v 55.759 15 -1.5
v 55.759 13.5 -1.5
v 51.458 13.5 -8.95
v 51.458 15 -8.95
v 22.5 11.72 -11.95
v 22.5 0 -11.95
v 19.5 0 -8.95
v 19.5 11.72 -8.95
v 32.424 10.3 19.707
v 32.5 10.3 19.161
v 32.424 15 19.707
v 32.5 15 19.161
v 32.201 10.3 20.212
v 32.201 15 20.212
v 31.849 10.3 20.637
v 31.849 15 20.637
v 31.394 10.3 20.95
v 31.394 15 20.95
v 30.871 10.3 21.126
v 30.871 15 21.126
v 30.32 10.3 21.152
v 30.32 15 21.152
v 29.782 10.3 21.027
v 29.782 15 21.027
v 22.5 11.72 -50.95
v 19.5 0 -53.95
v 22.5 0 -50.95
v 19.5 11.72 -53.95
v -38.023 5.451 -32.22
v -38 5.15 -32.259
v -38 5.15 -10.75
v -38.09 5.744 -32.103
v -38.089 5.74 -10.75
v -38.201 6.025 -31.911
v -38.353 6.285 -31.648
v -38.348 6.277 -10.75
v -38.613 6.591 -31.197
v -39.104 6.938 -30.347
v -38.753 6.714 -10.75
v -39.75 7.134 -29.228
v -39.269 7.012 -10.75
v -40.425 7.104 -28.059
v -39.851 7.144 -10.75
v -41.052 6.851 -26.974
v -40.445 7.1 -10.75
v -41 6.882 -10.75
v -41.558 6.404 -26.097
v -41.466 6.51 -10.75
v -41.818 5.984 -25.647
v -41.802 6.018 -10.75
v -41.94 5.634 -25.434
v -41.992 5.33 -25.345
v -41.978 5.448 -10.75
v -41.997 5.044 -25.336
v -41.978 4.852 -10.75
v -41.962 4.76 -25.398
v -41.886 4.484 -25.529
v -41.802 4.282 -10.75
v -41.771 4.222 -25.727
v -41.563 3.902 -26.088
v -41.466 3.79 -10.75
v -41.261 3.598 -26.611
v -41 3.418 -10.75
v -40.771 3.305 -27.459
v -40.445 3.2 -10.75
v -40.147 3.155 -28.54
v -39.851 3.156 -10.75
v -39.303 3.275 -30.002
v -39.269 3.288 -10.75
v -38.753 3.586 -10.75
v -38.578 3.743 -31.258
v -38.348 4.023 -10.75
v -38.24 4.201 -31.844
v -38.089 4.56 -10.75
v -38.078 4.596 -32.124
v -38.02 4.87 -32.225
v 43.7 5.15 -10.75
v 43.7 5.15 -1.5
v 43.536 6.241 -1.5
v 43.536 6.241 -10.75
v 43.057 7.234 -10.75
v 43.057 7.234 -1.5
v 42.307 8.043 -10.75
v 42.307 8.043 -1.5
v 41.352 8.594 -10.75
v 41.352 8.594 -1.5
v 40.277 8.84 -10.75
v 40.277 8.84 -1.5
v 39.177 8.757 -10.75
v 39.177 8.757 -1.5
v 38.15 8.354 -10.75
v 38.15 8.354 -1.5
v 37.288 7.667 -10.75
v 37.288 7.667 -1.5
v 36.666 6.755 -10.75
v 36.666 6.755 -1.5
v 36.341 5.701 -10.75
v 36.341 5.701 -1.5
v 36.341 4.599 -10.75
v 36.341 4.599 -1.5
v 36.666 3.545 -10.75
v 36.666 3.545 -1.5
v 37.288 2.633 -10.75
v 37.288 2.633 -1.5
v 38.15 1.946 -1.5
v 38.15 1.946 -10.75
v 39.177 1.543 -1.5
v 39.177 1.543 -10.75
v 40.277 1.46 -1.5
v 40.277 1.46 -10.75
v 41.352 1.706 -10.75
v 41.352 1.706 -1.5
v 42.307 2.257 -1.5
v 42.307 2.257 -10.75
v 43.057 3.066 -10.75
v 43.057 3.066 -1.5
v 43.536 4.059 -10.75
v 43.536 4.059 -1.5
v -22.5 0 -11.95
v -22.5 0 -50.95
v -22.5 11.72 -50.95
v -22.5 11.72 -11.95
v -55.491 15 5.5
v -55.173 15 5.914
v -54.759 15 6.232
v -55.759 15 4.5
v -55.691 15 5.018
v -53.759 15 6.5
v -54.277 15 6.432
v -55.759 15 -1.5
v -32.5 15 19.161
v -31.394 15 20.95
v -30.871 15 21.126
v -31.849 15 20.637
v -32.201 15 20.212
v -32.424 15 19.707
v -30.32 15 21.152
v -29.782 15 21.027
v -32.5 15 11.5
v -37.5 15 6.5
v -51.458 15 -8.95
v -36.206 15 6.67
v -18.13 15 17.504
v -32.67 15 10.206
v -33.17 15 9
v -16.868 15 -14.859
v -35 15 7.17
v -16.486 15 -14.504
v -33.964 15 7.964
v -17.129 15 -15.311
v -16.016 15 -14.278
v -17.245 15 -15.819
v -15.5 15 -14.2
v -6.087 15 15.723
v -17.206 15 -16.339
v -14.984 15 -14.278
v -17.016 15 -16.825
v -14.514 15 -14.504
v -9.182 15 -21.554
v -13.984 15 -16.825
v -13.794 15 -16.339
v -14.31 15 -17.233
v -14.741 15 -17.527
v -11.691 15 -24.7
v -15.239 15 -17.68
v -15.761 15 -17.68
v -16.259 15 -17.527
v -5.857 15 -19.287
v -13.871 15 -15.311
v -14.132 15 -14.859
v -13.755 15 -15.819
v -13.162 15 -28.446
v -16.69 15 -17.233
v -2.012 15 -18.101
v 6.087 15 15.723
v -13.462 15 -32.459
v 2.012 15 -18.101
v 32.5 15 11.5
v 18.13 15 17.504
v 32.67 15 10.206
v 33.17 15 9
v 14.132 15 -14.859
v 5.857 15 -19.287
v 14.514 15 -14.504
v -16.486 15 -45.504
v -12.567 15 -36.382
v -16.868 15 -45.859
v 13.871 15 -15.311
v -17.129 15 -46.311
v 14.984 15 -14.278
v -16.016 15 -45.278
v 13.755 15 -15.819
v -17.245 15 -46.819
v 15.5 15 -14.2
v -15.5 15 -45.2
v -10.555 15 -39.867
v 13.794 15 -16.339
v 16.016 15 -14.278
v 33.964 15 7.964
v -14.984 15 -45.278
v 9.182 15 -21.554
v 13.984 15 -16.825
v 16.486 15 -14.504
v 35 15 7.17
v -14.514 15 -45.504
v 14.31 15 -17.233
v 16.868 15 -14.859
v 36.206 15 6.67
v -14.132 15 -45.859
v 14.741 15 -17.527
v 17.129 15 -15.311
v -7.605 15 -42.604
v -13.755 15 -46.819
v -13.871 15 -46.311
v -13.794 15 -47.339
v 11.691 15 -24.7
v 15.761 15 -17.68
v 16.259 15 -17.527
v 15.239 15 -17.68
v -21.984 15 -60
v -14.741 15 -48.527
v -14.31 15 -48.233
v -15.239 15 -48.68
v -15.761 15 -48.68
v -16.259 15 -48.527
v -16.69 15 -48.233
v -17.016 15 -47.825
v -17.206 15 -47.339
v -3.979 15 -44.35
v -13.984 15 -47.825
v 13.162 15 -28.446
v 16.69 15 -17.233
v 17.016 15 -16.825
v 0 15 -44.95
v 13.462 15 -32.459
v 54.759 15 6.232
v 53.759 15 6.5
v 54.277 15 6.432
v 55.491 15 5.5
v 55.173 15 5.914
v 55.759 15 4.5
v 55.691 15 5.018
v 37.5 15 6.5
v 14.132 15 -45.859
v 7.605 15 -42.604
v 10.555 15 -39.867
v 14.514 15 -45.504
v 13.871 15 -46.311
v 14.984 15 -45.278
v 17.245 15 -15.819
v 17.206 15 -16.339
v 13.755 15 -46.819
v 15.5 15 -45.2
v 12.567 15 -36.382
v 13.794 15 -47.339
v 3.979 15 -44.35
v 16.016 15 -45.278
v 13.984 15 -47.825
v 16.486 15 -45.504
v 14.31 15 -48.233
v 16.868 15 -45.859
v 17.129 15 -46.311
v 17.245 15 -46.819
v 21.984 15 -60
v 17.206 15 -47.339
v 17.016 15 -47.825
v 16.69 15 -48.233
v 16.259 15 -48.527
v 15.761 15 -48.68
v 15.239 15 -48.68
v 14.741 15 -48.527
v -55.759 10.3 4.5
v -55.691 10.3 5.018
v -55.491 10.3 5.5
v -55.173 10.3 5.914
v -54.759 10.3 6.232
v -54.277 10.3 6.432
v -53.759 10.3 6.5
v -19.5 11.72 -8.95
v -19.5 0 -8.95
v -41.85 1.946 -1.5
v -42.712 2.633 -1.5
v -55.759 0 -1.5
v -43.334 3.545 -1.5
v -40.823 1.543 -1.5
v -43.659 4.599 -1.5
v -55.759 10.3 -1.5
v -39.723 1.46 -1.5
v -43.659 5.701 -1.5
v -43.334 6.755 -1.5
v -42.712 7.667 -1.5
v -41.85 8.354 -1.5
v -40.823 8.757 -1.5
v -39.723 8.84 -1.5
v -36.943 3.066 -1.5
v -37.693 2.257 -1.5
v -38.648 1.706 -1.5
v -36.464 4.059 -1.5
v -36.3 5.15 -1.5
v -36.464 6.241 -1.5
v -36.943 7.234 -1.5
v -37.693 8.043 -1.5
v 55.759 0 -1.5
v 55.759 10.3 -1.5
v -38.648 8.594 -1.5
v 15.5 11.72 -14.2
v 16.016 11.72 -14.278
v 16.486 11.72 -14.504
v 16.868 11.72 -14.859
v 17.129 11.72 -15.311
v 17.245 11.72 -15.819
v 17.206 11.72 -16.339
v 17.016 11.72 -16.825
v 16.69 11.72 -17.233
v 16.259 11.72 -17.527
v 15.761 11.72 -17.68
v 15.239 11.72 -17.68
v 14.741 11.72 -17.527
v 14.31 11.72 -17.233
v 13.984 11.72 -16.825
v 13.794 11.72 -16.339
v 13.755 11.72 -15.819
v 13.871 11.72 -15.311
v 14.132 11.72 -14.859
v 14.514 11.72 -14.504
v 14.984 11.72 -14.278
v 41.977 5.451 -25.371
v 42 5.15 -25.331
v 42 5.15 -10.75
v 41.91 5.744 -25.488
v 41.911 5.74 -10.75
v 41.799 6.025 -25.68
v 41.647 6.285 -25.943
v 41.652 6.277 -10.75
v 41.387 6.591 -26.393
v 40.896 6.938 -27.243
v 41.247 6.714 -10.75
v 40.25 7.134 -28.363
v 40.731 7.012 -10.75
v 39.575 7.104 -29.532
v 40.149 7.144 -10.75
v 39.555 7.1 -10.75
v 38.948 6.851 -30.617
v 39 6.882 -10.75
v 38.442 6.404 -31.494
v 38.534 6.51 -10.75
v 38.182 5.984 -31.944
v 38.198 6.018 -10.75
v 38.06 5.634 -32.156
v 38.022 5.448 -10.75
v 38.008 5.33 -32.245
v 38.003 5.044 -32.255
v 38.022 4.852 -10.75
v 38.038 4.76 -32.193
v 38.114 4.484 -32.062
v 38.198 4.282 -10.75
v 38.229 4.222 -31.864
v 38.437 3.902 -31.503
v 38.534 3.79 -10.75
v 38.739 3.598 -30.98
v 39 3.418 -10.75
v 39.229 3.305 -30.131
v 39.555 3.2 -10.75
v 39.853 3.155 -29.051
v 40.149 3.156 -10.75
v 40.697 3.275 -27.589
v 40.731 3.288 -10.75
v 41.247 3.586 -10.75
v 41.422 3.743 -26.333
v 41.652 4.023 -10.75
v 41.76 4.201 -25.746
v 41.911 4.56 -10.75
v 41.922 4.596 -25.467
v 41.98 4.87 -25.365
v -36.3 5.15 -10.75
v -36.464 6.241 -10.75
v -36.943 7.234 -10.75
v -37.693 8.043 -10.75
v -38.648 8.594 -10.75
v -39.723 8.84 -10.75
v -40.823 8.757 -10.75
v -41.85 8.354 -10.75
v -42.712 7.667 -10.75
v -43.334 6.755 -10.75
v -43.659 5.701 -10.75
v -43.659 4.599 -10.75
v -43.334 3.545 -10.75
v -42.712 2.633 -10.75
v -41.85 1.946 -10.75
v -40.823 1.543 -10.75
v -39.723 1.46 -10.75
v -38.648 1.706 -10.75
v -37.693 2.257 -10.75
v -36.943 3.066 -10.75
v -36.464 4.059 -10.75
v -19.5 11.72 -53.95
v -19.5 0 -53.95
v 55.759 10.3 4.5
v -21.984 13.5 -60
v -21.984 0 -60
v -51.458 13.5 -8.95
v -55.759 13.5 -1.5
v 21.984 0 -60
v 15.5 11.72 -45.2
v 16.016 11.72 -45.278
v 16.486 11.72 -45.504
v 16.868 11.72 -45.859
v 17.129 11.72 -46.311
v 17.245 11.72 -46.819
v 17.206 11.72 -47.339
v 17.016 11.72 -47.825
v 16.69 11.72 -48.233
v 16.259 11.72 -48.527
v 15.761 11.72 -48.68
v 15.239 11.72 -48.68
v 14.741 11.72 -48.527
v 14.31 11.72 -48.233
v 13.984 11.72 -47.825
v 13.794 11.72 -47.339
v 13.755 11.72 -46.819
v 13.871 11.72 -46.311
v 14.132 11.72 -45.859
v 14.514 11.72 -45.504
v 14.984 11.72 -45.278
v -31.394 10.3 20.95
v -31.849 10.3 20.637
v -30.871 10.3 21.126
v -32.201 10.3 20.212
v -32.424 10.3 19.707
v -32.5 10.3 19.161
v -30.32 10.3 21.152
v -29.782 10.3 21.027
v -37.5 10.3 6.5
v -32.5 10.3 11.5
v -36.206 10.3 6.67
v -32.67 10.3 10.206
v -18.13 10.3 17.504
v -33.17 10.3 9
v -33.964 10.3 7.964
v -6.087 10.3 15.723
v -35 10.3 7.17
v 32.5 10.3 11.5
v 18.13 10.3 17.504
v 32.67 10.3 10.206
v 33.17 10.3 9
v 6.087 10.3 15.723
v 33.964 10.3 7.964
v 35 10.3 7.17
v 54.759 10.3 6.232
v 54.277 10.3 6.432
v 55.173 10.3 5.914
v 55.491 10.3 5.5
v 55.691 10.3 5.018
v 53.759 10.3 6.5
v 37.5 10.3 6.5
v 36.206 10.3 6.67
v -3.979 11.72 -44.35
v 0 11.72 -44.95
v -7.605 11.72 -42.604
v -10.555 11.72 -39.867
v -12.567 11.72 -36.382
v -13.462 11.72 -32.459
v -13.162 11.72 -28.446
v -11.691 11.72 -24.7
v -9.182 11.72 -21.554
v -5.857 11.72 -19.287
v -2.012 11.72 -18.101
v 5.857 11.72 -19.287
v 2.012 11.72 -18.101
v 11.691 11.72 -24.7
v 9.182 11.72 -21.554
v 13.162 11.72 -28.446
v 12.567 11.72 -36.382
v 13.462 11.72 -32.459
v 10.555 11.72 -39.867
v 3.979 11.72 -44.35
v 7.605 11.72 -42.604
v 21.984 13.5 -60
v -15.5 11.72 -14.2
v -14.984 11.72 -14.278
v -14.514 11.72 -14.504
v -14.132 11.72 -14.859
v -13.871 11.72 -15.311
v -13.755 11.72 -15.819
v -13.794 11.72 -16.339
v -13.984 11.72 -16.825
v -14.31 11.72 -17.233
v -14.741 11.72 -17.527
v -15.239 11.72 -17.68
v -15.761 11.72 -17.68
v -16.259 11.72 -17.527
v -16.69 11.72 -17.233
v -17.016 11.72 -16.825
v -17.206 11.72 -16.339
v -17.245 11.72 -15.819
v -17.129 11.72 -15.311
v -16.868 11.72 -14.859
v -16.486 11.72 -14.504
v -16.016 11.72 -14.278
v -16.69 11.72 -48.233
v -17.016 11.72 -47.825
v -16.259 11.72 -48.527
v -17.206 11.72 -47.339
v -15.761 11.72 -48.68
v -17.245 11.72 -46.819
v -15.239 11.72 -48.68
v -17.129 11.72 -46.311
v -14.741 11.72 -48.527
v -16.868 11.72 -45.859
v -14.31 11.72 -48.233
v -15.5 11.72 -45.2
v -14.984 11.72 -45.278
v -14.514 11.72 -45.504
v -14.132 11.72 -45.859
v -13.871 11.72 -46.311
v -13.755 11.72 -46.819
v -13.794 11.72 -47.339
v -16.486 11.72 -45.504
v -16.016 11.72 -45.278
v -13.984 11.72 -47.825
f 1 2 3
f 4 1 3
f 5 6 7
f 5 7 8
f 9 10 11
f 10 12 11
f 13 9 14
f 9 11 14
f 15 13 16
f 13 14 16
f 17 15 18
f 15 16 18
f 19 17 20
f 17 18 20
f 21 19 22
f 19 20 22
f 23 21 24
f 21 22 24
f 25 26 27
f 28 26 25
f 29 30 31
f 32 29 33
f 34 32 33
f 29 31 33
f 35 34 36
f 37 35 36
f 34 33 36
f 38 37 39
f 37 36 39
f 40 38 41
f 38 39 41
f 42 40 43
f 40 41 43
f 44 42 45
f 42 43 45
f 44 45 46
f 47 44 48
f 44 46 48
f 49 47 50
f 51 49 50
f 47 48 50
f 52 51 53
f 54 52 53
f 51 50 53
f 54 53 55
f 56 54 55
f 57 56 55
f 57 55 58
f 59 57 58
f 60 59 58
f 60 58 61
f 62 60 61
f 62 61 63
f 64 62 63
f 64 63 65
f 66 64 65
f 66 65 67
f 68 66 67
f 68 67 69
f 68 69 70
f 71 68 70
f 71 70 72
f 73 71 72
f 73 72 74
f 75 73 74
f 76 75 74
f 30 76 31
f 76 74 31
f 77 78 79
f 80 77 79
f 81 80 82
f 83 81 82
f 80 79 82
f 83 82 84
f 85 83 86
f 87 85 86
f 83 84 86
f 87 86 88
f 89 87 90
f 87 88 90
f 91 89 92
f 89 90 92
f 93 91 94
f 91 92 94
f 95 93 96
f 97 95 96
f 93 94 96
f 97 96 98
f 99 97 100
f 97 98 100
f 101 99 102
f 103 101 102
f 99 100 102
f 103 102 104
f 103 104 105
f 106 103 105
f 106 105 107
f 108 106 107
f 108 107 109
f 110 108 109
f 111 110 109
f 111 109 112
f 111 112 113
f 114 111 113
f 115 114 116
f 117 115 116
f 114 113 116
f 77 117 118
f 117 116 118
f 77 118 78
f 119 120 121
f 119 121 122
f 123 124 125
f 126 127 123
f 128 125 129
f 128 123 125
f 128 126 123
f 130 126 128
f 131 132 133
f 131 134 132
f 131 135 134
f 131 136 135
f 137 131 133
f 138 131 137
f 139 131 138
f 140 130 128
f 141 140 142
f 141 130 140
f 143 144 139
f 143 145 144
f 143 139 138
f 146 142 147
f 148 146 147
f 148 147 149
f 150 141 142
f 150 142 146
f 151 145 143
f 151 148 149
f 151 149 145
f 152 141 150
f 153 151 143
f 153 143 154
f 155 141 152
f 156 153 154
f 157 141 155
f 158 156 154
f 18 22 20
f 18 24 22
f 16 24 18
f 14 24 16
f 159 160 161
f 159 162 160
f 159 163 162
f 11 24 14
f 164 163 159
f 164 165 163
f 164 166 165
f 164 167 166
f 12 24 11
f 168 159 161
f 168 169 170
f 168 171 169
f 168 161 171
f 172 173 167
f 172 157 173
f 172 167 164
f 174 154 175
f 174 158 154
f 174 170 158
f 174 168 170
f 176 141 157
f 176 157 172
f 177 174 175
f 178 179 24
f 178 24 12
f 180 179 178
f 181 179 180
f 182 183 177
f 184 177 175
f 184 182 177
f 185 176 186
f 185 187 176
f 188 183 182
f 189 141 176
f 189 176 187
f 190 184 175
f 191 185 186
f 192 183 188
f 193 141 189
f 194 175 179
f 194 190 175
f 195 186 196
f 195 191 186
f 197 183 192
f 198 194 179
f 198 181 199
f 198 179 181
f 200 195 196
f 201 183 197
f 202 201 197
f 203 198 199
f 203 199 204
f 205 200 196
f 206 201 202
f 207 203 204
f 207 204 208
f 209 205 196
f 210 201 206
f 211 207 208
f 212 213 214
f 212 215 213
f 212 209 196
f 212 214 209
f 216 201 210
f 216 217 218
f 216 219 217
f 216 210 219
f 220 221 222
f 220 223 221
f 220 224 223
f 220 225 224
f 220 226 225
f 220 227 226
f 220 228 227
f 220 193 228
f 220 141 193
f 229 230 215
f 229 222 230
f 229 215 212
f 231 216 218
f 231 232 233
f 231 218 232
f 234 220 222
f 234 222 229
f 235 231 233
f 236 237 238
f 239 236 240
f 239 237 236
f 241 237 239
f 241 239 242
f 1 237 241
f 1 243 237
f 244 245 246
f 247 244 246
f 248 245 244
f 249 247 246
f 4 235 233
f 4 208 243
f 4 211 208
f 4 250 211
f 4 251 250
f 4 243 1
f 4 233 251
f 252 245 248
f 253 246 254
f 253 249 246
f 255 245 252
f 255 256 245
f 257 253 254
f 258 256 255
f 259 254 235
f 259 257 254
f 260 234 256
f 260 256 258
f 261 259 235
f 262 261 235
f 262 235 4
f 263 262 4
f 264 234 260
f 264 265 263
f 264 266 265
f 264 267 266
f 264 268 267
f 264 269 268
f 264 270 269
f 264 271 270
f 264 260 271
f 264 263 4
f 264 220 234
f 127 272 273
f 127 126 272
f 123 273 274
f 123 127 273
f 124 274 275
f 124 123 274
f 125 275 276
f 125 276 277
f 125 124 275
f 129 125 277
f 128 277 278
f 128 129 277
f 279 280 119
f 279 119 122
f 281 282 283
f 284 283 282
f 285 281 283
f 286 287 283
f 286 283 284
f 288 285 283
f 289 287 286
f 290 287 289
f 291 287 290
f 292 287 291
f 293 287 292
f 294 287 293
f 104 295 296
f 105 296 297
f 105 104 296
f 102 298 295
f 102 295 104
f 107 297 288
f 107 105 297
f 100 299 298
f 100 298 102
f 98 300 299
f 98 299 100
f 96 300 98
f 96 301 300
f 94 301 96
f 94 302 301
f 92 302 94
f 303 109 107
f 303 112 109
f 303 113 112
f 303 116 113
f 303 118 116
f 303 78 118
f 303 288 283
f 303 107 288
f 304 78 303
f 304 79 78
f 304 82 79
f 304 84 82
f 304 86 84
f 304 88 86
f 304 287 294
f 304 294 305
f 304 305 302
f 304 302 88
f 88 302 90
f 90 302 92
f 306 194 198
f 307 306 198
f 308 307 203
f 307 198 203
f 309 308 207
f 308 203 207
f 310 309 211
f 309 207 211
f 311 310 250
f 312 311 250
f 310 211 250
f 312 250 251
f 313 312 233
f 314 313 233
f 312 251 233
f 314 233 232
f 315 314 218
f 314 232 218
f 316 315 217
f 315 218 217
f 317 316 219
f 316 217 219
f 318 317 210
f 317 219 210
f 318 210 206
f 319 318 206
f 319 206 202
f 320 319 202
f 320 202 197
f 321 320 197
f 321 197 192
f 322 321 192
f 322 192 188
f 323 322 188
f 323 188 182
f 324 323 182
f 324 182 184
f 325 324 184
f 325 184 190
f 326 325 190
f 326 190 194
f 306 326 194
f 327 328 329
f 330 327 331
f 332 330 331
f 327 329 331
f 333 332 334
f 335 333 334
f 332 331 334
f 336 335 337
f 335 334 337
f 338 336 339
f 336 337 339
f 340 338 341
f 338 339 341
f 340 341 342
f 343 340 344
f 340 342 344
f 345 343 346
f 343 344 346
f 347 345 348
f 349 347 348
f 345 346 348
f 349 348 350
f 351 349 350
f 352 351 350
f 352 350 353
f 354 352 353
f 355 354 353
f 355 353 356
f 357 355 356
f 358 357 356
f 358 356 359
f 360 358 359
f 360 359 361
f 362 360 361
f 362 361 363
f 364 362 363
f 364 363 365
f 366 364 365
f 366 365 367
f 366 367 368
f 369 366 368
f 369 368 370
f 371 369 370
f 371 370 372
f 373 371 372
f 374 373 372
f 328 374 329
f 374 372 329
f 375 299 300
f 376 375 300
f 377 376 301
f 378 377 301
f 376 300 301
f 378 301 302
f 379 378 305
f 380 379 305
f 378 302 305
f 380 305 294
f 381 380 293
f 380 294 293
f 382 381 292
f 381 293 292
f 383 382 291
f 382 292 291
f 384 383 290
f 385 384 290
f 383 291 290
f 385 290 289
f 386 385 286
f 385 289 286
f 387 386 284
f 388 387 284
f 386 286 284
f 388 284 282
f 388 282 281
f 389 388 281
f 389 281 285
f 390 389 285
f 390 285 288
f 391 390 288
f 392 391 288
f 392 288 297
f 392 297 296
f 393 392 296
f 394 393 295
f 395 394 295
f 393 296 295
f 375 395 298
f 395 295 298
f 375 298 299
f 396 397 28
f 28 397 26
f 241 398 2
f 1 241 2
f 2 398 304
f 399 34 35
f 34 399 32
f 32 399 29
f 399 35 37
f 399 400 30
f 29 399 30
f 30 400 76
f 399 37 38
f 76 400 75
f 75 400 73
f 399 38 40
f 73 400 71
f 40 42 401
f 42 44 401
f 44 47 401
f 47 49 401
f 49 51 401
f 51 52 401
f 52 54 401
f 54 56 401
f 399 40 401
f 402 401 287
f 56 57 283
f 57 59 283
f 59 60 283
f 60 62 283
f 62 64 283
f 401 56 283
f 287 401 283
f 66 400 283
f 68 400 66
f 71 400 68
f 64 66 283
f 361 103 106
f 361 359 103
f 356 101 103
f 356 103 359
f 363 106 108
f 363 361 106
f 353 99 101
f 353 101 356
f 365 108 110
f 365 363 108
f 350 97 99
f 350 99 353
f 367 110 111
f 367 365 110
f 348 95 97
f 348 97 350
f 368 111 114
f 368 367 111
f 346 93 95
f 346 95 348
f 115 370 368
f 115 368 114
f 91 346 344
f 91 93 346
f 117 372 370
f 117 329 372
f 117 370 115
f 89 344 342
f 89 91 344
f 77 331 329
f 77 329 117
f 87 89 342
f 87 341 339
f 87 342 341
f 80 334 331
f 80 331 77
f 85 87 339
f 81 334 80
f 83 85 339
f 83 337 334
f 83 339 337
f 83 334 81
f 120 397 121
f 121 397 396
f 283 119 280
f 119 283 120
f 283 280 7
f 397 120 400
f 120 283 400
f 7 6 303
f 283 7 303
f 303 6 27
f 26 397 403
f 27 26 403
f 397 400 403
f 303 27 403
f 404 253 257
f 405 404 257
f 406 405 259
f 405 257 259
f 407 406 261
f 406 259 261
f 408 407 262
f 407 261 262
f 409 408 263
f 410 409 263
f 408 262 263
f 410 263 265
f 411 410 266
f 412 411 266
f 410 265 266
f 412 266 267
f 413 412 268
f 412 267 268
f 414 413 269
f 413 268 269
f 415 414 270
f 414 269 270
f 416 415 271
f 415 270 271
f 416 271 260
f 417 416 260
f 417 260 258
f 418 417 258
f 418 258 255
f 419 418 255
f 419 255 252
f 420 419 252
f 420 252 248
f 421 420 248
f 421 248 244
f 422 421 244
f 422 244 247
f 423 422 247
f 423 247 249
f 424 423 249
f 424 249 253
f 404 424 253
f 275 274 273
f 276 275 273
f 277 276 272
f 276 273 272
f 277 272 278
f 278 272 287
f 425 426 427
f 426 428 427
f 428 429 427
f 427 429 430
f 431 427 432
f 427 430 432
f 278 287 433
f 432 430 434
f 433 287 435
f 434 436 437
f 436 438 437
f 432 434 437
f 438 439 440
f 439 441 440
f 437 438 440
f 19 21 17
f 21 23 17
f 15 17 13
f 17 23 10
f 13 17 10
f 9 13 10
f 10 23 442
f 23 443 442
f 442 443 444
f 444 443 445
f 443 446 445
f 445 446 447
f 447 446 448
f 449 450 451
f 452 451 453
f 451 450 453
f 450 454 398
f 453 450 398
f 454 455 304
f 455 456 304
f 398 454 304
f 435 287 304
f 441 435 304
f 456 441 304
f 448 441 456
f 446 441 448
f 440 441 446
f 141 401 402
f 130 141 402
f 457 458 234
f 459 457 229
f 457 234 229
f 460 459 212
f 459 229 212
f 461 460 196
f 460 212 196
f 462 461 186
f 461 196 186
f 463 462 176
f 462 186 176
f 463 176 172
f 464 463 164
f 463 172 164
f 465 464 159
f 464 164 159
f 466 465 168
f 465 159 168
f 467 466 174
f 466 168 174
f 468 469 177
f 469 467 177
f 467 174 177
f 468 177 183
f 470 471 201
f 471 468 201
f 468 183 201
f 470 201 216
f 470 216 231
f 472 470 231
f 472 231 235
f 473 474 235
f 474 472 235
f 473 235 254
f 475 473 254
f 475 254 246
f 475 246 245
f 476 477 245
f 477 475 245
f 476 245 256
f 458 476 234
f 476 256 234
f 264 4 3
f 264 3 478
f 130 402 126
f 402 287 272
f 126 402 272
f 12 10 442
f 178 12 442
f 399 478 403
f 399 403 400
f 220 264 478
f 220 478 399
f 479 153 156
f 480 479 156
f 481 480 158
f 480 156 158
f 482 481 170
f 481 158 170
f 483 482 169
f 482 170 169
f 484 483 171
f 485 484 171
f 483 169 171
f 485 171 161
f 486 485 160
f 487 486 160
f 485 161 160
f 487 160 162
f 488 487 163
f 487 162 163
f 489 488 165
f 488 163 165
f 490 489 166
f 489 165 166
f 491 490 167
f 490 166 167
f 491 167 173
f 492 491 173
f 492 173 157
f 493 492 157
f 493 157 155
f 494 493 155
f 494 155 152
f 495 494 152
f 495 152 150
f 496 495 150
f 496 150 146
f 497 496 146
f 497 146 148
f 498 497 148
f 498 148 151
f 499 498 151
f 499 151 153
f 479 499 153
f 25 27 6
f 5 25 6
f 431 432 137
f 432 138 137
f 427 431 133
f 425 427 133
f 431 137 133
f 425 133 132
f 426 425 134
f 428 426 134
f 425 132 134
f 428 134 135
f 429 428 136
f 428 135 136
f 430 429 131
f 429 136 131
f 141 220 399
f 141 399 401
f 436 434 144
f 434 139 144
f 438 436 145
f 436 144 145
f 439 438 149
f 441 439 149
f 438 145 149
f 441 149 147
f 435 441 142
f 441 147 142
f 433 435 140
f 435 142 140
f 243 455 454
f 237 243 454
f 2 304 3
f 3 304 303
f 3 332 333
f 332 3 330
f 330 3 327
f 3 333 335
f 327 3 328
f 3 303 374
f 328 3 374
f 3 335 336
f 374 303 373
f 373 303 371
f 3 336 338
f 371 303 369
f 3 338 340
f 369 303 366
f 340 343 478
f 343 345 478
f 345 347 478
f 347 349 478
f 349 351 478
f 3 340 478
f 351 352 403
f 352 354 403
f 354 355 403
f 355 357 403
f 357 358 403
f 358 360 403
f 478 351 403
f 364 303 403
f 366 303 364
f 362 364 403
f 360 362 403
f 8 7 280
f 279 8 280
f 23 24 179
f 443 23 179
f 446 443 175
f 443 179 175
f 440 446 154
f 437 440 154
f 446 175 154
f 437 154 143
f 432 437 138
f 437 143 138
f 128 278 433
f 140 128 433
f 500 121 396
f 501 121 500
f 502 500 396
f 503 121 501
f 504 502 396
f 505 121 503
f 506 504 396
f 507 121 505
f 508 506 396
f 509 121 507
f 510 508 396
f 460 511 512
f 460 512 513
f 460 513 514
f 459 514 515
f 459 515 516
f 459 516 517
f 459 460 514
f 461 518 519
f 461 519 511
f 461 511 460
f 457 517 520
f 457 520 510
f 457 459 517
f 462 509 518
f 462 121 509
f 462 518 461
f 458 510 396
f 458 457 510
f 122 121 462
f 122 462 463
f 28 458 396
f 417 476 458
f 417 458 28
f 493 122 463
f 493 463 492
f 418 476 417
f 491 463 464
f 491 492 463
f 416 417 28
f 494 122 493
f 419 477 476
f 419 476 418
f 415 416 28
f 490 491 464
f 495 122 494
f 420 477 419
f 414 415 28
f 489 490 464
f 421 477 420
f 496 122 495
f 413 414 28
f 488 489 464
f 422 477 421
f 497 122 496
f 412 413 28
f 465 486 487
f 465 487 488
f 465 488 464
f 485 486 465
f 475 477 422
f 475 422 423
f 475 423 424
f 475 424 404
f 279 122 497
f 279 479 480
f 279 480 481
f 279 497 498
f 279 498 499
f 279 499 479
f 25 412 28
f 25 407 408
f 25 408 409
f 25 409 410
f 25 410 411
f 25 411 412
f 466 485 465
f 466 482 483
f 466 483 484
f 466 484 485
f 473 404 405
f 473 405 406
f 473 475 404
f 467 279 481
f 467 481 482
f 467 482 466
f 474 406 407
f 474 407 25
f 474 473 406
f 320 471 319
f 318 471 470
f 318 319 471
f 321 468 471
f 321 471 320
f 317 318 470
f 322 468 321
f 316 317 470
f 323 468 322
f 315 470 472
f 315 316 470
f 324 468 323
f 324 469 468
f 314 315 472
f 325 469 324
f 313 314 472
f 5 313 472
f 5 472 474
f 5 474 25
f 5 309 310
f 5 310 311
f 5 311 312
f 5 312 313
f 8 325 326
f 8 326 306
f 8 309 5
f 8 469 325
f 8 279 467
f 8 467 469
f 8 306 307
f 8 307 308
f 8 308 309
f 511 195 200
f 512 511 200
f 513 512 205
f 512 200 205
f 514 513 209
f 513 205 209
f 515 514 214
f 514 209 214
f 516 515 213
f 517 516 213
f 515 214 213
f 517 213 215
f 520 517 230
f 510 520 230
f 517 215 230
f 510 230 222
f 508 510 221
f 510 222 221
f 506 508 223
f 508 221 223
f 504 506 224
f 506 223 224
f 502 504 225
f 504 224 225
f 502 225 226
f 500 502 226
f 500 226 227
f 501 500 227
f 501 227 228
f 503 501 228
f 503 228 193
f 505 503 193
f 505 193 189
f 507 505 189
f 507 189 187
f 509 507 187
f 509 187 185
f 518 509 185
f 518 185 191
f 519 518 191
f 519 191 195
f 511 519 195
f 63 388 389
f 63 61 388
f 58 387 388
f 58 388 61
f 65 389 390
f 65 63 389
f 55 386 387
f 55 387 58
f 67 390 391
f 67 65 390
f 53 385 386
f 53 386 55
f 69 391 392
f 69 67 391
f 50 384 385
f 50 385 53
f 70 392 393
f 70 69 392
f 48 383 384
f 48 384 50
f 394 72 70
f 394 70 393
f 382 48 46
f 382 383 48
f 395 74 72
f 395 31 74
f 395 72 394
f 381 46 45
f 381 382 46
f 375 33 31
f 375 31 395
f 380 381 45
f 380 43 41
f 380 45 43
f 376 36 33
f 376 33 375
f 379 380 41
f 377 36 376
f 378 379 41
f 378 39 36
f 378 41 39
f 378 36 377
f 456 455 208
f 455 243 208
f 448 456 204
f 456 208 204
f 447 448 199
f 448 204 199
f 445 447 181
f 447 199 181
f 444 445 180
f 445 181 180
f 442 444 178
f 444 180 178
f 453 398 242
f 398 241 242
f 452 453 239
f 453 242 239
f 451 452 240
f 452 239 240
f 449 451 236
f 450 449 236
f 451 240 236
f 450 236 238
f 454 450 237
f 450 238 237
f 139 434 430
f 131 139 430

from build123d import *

# Parameters (mm, degrees)
BOSS_EXTRUDE1_DEPTH = 13.5
SKETCH2_W           = 45
SKETCH2_H           = 45
CUT_EXTRUDE1_DEPTH  = 11.72
SKETCH3_R           = 13.5
CUT_EXTRUDE2_DEPTH  = 84.329160712
CHAMFER1_SIZE       = 3
SKETCH7_W           = 113.25
SKETCH7_H           = 1.5
CUT_EXTRUDE4_DEPTH  = 84.598089841
SKETCH5_R           = 1.75
CUT_EXTRUDE7_DEPTH  = 84.013934059
BOSS_EXTRUDE2_START = 5
BOSS_EXTRUDE2_DEPTH = 20
CUT_EXTRUDE8_START  = -30
SKETCH11_W          = 111.517949192
SKETCH11_H          = 10.6
CUT_EXTRUDE8_DEPTH  = 30
SKETCH12_R          = 2
CUT_EXTRUDE9_DEPTH  = 83.19679585
SKETCH13_R          = 3.7
CUT_EXTRUDE10_DEPTH = 9.25
SKETCH14_R          = 83
CUT_EXTRUDE11_DEPTH = 9.25
FILLET1_R           = 5
SKETCH15_W          = 65
SKETCH15_H          = 8
CUT_EXTRUDE12_DEPTH = 9.25
FILLET2_R           = 2
SKETCH16_W          = 23.258974596
SKETCH16_H          = 14
BOSS_EXTRUDE3_DEPTH = 4.7
FILLET3_R           = 5
BOSS_EXTRUDE4_START = 1.5
SKETCH17_R          = 1.75
SKETCH17_R_2        = 13.5
BOSS_EXTRUDE4_DEPTH = 1.5
SKETCH18_W          = 153.260867966
SKETCH18_H          = 50.841882228
CUT_EXTRUDE13_DEPTH = 5


with BuildPart() as part:
    # Sketch1 → Boss-Extrude1 (new body)
    with BuildSketch(Plane(origin=(0, 0, 0), x_dir=(1, 0, 0), z_dir=(0, 1, 0))):
        Polygon((-56.625, 0), (56.625, 0), (21.983983849, 60), (-21.983983849, 60), align=None)
    extrude(amount=BOSS_EXTRUDE1_DEPTH)

    # Sketch2 → Cut-Extrude1 (cut)
    with BuildSketch(Plane.XZ):
        with Locations((0, -31.45)):
            Rectangle(SKETCH2_W, SKETCH2_H)
    extrude(amount=-CUT_EXTRUDE1_DEPTH, mode=Mode.SUBTRACT)

    # Sketch3 → Cut-Extrude2 (cut, through all)
    with BuildSketch(Plane.XZ.offset(-11.72)):
        with Locations(Location((0, -31.45, 0), (0, 0, 270))):
            Circle(SKETCH3_R)
    extrude(amount=-CUT_EXTRUDE2_DEPTH, mode=Mode.SUBTRACT)

    # Chamfer1
    chamfer1_edges = [part.edges().sort_by_distance(p)[0] for p in [
        (-22.5, 5.86, -8.95),
        (-22.5, 5.86, -53.95),
        (22.5, 5.86, -53.95),
        (22.5, 5.86, -8.95),
    ]]
    chamfer(chamfer1_edges, length=CHAMFER1_SIZE)

    # Sketch7 → Cut-Extrude4 (cut, through all)
    with BuildSketch(Plane(origin=(0, 13.5, 0), x_dir=(1, 0, 0), z_dir=(0, 1, 0))):
        with Locations((0, 0.75)):
            Rectangle(SKETCH7_W, SKETCH7_H)
    extrude(amount=-CUT_EXTRUDE4_DEPTH, mode=Mode.SUBTRACT)

    # Sketch5 → Cut-Extrude7 (cut, through all)
    with BuildSketch(Plane(origin=(0, 13.5, 0), x_dir=(1, 0, 0), z_dir=(0, 1, 0))):
        with Locations(Location((15.5, 46.95, 0), (0, 0, 270))):
            Circle(SKETCH5_R)
        with Locations(Location((15.5, 15.95, 0), (0, 0, 270))):
            Circle(SKETCH5_R)
        with Locations(Location((-15.5, 15.95, 0), (0, 0, 270))):
            Circle(SKETCH5_R)
        with Locations(Location((-15.5, 46.95, 0), (0, 0, 270))):
            Circle(SKETCH5_R)
    extrude(amount=-CUT_EXTRUDE7_DEPTH, mode=Mode.SUBTRACT)

    # Sketch10 → Boss-Extrude2 (add)
    with BuildSketch(Plane.XZ.offset(BOSS_EXTRUDE2_START)):
        Polygon((51.457715091, -8.95), (-51.457715091, -8.95), (-55.758974596, -1.5), (-55.758974596, 6.5), (-32.5, 6.5), (-32.5, 28.5), (32.5, 28.5), (32.5, 6.5), (55.758974596, 6.5), (55.758974596, -1.5), align=None)
    extrude(amount=-BOSS_EXTRUDE2_DEPTH)

    # Sketch11 → Cut-Extrude8 (cut)
    with BuildSketch(Plane.XY.offset(28.5).offset(CUT_EXTRUDE8_START)):
        with Locations((0, 5)):
            Rectangle(SKETCH11_W, SKETCH11_H)
    extrude(amount=CUT_EXTRUDE8_DEPTH, mode=Mode.SUBTRACT)

    # Sketch12 → Cut-Extrude9 (cut, through all)
    with BuildSketch(Plane.XY.offset(-1.5)):
        with Locations((-40, 5.15)):
            Circle(SKETCH12_R)
        with Locations((40, 5.15)):
            Circle(SKETCH12_R)
    extrude(amount=-CUT_EXTRUDE9_DEPTH, mode=Mode.SUBTRACT)

    # Sketch13 → Cut-Extrude10 (cut)
    with BuildSketch(Plane.XY.offset(-1.5)):
        with Locations((-40, 5.15)):
            Circle(SKETCH13_R)
        with Locations((40, 5.15)):
            Circle(SKETCH13_R)
    extrude(amount=-CUT_EXTRUDE10_DEPTH, mode=Mode.SUBTRACT)

    # Sketch14 → Cut-Extrude11 (cut)
    with BuildSketch(Plane(origin=(0, 15, 0), x_dir=(1, 0, 0), z_dir=(0, 1, 0))):
        with Locations((0, -98.5)):
            Circle(SKETCH14_R)
    extrude(amount=-CUT_EXTRUDE11_DEPTH, mode=Mode.SUBTRACT)

    # Fillet1
    fillet1_edges = [part.edges().sort_by_distance(p)[0] for p in [
        (-32.5, 12.65, 6.5),
        (32.5, 12.65, 6.5),
        (32.5, -2.65, 6.5),
        (-32.5, -2.65, 6.5),
    ]]
    fillet(fillet1_edges, radius=FILLET1_R)

    # Sketch15 → Cut-Extrude12 (cut)
    with BuildSketch(Plane.XZ.offset(5)):
        with Locations((0, 24.5)):
            Rectangle(SKETCH15_W, SKETCH15_H)
    extrude(amount=-CUT_EXTRUDE12_DEPTH, mode=Mode.SUBTRACT)

    # Fillet2
    fillet2_edges = [part.edges().sort_by_distance(p)[0] for p in [
        (-55.758974596, 12.65, 6.5),
        (55.758974596, 12.65, 6.5),
        (-32.5, 12.65, 22.127557326),
        (32.5, 12.65, 22.127557326),
    ]]
    fillet(fillet2_edges, radius=FILLET2_R)

    # Sketch16 → Boss-Extrude3 (add)
    with BuildSketch(Plane.XZ.offset(5)):
        with Locations((-44.129487298, 13.5)):
            Rectangle(SKETCH16_W, SKETCH16_H)
        with Locations((44.129487298, 13.5)):
            Rectangle(SKETCH16_W, SKETCH16_H)
    extrude(amount=-BOSS_EXTRUDE3_DEPTH)

    # Fillet3
    fillet3_edges = [part.edges().sort_by_distance(p)[0] for p in [
        (-55.758974596, -2.65, 20.5),
        (55.758974596, -2.65, 20.5),
    ]]
    fillet(fillet3_edges, radius=FILLET3_R)

    # Sketch17 → Boss-Extrude4 (add)
    with BuildSketch(Plane(origin=(0, 13.5, 0), x_dir=(1, 0, 0), z_dir=(0, 1, 0)).offset(BOSS_EXTRUDE4_START)):
        Polygon((-51.457715091, 8.95), (51.457715091, 8.95), (21.983983849, 60), (-21.983983849, 60), align=None)
        with Locations(Location((-15.5, 15.95, 0), (0, 0, 270))):
            Circle(SKETCH17_R, mode=Mode.SUBTRACT)
        with Locations(Location((-15.5, 46.95, 0), (0, 0, 270))):
            Circle(SKETCH17_R, mode=Mode.SUBTRACT)
        with Locations(Location((15.5, 46.95, 0), (0, 0, 270))):
            Circle(SKETCH17_R, mode=Mode.SUBTRACT)
        with Locations(Location((15.5, 15.95, 0), (0, 0, 270))):
            Circle(SKETCH17_R, mode=Mode.SUBTRACT)
        with Locations(Location((0, 31.45, 0), (0, 0, 90))):
            Circle(SKETCH17_R_2, mode=Mode.SUBTRACT)
    extrude(amount=-BOSS_EXTRUDE4_DEPTH)

    # Sketch18 → Cut-Extrude13 (cut)
    with BuildSketch(Plane.XZ.offset(5)):
        with Locations((-0.752597738, 9.037202)):
            Rectangle(SKETCH18_W, SKETCH18_H)
    extrude(amount=-CUT_EXTRUDE13_DEPTH, mode=Mode.SUBTRACT)


solid = part.part
